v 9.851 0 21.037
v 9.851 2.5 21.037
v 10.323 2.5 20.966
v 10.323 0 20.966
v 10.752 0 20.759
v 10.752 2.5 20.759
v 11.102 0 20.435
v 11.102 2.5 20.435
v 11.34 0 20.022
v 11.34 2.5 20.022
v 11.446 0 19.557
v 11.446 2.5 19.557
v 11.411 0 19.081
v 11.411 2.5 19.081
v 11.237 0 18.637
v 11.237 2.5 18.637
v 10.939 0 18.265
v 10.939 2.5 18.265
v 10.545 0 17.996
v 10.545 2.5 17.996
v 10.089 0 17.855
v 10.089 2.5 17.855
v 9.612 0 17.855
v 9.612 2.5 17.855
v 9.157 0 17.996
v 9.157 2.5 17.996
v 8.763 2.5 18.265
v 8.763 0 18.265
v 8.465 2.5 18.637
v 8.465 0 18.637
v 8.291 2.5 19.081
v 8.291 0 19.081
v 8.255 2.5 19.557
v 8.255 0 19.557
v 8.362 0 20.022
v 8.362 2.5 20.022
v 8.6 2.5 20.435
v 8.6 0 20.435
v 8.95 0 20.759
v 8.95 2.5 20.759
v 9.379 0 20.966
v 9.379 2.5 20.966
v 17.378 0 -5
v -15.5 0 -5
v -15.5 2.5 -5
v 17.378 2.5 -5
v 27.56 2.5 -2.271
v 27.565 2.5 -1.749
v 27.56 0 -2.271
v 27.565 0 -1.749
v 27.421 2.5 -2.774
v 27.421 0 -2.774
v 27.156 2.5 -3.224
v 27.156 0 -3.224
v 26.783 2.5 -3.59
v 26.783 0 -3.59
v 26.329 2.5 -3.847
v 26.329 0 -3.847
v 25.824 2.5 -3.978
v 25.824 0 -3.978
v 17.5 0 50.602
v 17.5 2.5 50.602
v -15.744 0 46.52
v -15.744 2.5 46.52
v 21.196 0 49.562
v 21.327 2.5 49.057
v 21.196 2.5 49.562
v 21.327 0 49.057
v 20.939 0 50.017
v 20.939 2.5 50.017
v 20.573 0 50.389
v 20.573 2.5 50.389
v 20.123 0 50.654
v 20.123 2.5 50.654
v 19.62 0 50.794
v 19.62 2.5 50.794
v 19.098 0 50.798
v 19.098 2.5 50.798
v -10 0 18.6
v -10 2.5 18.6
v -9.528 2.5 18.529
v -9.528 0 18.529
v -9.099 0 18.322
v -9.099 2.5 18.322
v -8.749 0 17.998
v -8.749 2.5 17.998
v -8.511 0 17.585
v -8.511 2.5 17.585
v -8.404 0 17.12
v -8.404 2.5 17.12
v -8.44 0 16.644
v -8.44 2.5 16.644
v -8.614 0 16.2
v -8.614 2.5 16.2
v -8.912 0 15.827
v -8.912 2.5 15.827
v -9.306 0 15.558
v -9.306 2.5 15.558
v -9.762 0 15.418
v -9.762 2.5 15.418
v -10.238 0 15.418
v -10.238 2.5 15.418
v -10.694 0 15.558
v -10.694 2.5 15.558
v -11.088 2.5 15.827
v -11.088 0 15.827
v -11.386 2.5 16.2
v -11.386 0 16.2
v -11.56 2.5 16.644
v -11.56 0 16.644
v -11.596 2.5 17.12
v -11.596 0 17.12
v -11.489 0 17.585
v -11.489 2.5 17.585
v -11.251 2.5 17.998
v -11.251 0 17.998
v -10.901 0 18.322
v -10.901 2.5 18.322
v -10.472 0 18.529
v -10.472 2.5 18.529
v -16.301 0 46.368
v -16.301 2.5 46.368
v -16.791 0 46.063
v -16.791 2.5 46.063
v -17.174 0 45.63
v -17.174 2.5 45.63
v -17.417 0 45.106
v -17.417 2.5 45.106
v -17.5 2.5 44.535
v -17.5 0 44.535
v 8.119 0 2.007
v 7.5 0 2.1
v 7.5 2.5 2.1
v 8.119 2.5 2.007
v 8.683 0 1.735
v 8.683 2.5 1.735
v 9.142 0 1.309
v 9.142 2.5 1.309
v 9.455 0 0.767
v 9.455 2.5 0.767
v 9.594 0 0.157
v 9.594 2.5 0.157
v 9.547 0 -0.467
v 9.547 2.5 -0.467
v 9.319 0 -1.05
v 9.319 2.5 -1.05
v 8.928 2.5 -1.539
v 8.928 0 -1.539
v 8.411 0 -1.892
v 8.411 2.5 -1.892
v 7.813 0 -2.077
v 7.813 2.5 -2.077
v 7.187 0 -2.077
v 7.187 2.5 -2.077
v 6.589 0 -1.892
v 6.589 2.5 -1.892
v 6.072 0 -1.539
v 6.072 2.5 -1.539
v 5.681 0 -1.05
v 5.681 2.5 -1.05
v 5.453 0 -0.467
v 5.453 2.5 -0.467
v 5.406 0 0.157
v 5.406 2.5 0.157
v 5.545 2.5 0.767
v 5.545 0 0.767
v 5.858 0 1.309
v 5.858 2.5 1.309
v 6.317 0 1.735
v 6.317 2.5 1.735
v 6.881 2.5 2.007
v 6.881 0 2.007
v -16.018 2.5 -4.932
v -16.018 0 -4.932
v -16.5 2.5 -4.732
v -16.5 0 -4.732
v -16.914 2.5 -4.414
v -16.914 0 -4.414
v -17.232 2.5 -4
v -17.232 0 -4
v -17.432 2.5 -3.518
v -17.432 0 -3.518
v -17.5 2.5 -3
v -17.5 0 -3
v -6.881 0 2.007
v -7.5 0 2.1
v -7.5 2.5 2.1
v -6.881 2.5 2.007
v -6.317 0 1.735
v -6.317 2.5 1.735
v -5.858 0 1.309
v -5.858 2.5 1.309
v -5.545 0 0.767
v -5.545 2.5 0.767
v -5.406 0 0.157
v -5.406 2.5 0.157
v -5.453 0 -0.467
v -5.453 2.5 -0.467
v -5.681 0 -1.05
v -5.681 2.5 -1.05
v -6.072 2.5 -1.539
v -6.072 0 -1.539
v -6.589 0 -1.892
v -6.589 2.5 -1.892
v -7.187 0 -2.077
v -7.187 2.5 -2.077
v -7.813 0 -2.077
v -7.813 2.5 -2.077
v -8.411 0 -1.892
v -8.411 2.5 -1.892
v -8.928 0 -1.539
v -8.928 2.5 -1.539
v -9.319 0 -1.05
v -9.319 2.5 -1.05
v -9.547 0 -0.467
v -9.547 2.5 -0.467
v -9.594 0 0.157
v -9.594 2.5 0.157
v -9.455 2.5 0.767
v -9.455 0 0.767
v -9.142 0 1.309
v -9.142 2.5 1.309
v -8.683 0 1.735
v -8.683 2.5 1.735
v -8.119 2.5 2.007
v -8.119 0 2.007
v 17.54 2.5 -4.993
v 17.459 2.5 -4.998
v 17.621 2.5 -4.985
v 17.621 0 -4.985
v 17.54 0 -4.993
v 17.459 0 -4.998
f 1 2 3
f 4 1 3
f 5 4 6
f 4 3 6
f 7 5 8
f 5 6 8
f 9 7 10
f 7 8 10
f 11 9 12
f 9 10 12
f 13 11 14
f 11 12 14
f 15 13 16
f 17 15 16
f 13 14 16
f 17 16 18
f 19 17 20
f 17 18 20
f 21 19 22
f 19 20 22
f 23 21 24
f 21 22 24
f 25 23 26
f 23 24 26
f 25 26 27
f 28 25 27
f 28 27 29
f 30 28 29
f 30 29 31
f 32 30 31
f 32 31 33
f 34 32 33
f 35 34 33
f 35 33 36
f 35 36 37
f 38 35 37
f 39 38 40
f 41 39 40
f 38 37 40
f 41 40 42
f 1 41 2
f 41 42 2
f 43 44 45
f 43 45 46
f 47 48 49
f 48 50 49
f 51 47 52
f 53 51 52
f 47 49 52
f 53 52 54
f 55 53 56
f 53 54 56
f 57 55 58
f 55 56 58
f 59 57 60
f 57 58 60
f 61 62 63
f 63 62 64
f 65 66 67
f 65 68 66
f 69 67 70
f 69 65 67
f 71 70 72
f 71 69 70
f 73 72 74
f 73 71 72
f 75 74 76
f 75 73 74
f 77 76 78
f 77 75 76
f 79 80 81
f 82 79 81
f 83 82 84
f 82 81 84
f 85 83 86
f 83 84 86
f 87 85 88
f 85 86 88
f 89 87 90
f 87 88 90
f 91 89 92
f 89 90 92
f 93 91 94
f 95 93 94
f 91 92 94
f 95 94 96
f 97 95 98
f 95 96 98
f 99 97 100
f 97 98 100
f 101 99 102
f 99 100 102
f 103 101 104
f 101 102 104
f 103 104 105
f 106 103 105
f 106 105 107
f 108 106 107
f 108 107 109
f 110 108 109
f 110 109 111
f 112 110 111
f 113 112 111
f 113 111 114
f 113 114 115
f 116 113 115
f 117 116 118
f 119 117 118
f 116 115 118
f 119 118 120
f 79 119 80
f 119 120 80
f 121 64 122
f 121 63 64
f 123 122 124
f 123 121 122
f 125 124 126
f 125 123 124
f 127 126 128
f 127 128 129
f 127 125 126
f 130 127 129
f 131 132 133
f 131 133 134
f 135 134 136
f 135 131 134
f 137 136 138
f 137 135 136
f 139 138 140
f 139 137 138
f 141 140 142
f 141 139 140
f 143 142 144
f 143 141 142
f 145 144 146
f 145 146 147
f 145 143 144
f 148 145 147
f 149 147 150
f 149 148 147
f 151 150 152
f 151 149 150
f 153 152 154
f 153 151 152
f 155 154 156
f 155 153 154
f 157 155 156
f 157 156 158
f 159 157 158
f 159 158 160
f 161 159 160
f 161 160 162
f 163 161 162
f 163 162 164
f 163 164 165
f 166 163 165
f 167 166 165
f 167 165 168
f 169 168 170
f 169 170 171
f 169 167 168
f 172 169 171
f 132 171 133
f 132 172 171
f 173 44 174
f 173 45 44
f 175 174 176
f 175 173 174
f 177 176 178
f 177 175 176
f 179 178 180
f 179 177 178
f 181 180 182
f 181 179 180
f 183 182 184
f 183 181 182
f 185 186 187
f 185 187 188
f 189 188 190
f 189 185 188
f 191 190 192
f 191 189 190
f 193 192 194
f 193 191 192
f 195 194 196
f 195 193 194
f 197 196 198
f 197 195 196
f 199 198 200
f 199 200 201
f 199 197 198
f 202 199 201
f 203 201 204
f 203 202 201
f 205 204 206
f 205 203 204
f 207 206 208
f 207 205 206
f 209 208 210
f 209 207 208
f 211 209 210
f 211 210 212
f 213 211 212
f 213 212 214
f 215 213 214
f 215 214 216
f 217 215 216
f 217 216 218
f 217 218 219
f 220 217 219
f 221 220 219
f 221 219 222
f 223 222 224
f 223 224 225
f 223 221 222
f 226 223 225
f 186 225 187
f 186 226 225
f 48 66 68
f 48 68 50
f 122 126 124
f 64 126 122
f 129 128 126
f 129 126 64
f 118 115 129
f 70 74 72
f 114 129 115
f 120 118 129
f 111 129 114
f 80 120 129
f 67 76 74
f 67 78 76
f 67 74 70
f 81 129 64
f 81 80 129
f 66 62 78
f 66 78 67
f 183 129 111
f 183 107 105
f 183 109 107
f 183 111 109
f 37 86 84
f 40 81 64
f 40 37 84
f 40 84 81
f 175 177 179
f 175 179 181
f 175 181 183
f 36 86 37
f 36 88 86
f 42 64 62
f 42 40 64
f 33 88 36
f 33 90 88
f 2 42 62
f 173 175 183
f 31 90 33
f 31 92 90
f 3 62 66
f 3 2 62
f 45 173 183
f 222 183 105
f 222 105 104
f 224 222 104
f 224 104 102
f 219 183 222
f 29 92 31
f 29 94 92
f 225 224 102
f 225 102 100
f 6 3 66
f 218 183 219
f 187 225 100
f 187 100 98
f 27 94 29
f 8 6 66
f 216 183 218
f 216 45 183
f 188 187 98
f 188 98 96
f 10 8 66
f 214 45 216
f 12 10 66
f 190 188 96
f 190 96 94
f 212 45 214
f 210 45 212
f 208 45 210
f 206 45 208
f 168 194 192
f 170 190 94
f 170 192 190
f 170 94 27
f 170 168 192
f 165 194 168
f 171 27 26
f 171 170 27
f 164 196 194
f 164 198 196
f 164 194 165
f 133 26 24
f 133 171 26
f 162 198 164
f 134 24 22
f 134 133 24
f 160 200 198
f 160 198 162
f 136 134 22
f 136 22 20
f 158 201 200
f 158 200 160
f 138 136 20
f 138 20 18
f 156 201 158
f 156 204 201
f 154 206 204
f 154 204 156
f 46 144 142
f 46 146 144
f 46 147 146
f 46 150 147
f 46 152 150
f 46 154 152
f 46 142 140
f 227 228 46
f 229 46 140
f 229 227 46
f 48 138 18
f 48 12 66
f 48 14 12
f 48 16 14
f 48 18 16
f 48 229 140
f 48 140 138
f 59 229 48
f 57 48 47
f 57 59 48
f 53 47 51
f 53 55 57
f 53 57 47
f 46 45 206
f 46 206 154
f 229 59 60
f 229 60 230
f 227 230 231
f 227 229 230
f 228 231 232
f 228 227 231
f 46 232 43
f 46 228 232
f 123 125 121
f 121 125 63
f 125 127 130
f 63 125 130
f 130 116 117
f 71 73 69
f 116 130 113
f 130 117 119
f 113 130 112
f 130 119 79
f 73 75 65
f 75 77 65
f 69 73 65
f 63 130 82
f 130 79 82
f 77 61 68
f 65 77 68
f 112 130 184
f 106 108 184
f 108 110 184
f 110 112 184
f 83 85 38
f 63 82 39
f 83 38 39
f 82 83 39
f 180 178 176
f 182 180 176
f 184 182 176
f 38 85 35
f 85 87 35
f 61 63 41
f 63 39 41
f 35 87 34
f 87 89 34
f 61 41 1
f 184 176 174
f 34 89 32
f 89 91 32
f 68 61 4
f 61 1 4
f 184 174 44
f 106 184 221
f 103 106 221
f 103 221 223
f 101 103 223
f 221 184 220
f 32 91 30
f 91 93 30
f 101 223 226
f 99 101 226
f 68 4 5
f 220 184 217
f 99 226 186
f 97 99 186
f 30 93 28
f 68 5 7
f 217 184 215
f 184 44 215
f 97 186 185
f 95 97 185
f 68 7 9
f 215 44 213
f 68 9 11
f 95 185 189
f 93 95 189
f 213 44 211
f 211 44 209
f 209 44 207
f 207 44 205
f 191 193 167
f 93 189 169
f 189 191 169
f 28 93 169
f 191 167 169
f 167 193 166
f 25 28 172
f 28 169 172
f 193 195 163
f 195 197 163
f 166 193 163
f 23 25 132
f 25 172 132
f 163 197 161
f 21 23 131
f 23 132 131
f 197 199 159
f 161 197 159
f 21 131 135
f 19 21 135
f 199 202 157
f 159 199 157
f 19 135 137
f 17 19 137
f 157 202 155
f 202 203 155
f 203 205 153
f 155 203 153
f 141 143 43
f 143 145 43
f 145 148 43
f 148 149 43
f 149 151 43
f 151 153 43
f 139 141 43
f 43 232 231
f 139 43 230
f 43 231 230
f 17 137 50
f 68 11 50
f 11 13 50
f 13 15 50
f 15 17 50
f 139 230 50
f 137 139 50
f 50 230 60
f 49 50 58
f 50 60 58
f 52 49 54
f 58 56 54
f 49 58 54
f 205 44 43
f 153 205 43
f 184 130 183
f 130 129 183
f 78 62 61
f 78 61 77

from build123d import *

# Parameters (mm, degrees)
SKETCH_1_W      = 35
SKETCH_1_H      = 10
SKETCH_1_R      = 2.1
EXTRUDE_1_DEPTH = 2.5
SKETCH_3_R      = 1.6
EXTRUDE_2_DEPTH = 2.5
EXTRUDE_3_DEPTH = 2.5
FILLET_1_R      = 2


with BuildPart() as part:
    # 草图1 → 凸台-拉伸1 (new body)
    with BuildSketch(Plane(origin=(0, 0, 0), x_dir=(1, 0, 0), z_dir=(0, 1, 0))):
        Rectangle(SKETCH_1_W, SKETCH_1_H)
        with Locations(Location((-7.5, 0, 0), (0, 0, 270))):
            Circle(SKETCH_1_R, mode=Mode.SUBTRACT)
        with Locations(Location((7.5, 0, 0), (0, 0, 270))):
            Circle(SKETCH_1_R, mode=Mode.SUBTRACT)
    extrude(amount=EXTRUDE_1_DEPTH)

    # 草图3 → 凸台-拉伸2 (add)
    with BuildSketch(Plane(origin=(0, 2.5, 0), x_dir=(1, 0, 0), z_dir=(0, 1, 0))):
        Polygon((-17.5, -5), (17.5, -5), (17.5, -50.601870189), (-17.5, -46.304410557), align=None)
        with Locations(Location((-10, -17, 0), (0, 0, 270))):
            Circle(SKETCH_3_R, mode=Mode.SUBTRACT)
        with Locations(Location((9.850923033, -19.437386868, 0), (0, 0, 270))):
            Circle(SKETCH_3_R, mode=Mode.SUBTRACT)
    extrude(amount=-EXTRUDE_2_DEPTH)

    # 草图4 → 凸台-拉伸3 (add)
    with BuildSketch(Plane(origin=(0, 2.5, 0), x_dir=(1, 0, 0), z_dir=(0, 1, 0))):
        Polygon((21.083035005, -51.041811568), (27.808689923, 3.734252034), (17.5, 5), (17.5, -50.601870189), align=None)
    extrude(amount=-EXTRUDE_3_DEPTH)

    # 圆角1
    fillet_1_edges = [part.edges().sort_by_distance(p)[0] for p in [
        (-17.5, 1.25, 46.304410557),
        (21.083035005, 1.25, 51.041811568),
        (27.808689923, 1.25, -3.734252034),
        (-17.5, 1.25, -5),
        (17.5, 1.25, -5),
    ]]
    fillet(fillet_1_edges, radius=FILLET_1_R)


solid = part.part
